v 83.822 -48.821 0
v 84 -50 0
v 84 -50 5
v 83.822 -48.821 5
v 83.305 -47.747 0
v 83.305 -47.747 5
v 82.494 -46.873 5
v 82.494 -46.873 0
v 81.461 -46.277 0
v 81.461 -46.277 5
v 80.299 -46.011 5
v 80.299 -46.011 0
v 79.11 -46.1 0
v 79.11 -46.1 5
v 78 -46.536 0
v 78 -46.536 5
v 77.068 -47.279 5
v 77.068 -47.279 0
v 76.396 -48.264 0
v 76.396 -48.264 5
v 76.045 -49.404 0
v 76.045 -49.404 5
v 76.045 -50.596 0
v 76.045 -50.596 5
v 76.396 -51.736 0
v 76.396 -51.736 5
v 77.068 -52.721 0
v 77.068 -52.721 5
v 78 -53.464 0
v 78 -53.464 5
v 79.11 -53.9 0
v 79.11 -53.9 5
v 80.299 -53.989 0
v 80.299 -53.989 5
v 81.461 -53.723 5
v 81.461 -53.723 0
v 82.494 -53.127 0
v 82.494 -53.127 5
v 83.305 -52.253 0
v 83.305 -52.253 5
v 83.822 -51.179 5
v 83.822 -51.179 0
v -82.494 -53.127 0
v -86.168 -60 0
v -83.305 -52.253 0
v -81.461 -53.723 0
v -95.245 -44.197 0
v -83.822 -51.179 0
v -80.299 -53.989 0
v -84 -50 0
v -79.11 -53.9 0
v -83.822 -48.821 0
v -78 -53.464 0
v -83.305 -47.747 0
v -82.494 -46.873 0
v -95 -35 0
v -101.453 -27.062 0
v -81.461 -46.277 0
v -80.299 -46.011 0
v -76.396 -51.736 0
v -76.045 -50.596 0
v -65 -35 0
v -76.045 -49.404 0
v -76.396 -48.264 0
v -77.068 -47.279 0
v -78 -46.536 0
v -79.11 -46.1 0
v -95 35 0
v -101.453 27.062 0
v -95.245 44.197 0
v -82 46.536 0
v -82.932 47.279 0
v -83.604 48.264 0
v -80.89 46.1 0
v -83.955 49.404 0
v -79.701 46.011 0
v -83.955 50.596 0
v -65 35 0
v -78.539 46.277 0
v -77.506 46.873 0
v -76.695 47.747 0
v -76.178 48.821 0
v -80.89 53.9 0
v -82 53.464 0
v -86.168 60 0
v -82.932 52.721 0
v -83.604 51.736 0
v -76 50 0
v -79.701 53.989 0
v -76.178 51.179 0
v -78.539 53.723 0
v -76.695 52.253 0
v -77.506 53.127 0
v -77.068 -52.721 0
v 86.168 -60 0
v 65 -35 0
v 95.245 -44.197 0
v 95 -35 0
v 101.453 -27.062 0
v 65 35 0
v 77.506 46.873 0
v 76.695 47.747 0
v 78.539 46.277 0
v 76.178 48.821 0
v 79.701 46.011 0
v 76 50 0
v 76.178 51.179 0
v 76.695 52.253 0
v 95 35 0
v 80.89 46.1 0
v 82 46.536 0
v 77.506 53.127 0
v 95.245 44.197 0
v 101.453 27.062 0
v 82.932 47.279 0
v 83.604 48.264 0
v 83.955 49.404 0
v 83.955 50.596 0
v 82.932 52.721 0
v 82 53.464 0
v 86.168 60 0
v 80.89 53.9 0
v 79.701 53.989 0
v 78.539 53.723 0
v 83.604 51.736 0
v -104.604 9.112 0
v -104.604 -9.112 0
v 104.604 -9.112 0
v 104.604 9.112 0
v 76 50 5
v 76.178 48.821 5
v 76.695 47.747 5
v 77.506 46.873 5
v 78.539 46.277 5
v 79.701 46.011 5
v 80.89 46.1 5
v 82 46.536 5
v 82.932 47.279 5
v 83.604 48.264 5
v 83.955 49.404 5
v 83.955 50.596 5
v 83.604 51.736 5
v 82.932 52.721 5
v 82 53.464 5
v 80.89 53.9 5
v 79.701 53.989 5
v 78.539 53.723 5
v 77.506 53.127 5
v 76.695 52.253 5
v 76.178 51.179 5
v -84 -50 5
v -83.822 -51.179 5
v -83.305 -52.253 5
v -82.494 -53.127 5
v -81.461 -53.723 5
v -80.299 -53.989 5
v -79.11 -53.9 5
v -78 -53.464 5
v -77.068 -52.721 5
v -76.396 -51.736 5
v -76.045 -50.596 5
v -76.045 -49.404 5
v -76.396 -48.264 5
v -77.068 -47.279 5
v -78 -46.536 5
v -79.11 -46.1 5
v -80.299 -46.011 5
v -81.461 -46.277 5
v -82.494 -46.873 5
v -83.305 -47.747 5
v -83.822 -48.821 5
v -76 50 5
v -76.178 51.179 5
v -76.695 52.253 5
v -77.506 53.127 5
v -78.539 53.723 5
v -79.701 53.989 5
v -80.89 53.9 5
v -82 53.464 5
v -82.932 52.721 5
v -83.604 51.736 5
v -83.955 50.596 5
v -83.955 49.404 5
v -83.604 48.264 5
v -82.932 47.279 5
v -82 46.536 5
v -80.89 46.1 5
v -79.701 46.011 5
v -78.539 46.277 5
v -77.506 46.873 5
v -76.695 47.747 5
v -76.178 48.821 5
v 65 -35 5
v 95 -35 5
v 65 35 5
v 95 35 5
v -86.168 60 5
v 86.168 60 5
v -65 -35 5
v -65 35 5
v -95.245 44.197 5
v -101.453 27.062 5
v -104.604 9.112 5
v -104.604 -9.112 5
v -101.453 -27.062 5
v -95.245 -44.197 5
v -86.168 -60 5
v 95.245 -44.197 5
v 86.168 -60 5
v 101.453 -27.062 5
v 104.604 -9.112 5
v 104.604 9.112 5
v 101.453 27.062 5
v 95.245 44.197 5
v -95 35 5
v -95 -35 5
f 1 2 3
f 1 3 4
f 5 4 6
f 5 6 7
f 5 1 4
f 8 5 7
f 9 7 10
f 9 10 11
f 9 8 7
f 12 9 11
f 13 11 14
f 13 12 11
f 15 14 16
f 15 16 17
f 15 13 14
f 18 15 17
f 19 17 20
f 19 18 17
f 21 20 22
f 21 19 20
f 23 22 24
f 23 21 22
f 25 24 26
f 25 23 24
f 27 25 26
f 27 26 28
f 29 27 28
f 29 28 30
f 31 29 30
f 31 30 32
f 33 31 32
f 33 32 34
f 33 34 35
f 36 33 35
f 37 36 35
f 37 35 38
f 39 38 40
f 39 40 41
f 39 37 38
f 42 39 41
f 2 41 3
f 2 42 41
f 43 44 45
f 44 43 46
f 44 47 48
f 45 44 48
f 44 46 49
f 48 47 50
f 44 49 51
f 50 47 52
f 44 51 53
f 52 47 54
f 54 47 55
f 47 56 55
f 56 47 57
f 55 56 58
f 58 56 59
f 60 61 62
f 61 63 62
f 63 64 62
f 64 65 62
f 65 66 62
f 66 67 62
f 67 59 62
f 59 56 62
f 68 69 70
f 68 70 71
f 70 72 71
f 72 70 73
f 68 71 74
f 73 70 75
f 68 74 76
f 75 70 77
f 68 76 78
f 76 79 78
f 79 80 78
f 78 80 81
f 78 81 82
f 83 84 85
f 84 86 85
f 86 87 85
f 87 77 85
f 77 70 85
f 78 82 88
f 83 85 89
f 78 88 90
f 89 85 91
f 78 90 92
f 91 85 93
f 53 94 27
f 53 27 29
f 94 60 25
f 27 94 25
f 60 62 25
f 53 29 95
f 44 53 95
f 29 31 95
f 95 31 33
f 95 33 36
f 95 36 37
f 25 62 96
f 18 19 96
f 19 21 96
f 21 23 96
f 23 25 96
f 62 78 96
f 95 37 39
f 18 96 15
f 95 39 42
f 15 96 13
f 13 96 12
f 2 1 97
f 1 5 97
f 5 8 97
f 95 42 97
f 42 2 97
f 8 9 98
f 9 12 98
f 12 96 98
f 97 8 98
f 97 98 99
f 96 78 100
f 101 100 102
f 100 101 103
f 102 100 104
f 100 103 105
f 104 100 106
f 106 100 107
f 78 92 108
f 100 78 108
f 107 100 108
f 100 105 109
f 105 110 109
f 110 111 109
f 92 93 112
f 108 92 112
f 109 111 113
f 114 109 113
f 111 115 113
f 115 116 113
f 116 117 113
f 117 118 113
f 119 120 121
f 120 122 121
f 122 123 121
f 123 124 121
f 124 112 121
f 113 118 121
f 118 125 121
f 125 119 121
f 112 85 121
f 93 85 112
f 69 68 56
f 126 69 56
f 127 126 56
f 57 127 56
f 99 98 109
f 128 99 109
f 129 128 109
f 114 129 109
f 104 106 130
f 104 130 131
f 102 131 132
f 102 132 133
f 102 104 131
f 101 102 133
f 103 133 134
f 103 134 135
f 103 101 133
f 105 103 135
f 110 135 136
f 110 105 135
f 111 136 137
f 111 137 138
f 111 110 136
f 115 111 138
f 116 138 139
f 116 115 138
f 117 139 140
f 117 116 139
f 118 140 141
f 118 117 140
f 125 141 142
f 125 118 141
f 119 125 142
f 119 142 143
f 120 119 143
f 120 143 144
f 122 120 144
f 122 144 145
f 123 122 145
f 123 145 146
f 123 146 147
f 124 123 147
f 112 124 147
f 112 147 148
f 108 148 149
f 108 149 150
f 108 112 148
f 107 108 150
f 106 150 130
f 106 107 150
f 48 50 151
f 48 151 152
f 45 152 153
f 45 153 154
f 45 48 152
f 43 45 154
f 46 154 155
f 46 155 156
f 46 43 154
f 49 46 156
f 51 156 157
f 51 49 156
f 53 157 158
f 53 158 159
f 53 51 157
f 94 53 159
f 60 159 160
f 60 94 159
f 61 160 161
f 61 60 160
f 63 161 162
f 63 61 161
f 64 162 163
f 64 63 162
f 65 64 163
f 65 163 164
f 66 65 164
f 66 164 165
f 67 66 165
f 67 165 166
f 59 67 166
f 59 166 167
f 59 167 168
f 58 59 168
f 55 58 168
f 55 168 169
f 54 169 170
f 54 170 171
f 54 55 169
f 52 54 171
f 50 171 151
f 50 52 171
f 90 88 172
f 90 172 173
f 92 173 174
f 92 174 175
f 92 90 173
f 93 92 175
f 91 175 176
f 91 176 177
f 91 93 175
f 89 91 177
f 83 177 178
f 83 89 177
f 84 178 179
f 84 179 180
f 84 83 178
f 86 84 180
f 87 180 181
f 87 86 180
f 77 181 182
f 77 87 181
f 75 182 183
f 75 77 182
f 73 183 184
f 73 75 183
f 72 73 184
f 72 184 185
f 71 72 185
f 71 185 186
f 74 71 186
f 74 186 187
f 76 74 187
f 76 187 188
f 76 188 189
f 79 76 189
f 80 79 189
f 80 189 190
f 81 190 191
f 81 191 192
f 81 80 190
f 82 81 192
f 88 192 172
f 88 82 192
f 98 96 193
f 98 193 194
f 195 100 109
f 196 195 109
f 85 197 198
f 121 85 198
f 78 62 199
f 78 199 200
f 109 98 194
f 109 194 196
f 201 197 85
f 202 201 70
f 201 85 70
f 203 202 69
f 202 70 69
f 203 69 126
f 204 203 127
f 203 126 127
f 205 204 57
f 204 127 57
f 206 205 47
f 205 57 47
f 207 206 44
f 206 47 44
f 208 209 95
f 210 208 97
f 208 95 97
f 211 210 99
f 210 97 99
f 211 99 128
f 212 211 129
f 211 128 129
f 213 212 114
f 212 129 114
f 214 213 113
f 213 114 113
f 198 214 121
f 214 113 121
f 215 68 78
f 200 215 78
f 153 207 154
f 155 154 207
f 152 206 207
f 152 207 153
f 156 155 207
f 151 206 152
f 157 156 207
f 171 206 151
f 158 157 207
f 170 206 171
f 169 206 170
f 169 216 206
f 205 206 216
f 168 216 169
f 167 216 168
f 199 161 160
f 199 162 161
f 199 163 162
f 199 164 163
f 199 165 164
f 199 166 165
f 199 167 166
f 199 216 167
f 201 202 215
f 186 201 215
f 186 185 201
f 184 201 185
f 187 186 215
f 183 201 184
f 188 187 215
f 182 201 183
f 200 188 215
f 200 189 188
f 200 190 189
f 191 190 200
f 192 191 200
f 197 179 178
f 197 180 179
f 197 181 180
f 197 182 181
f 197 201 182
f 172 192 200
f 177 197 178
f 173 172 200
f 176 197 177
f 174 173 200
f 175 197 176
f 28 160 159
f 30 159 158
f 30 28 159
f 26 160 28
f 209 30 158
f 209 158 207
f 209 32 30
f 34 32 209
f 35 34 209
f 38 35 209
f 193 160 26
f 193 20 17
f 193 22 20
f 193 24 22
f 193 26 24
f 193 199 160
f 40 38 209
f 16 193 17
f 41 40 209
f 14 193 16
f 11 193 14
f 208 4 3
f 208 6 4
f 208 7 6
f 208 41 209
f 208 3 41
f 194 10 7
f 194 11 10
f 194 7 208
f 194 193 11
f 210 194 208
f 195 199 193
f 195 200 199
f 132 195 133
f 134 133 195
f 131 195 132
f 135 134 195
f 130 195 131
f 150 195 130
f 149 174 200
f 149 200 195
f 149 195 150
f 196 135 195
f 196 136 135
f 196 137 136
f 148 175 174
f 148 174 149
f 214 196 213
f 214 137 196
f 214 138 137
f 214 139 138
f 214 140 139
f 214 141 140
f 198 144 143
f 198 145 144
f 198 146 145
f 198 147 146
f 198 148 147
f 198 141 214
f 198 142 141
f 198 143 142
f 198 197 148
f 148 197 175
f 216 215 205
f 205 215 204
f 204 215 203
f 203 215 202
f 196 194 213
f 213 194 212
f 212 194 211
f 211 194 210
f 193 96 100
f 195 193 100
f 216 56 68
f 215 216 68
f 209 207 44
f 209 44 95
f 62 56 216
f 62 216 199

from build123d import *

# Parameters (mm, degrees)
ESQUISSE1_R             = 105
ESQUISSE1_R_2           = 4
ESQUISSE1_W             = 30
ESQUISSE1_H             = 70
BOSS_EXTRU_1_DEPTH      = 5
ESQUISSE2_W             = 250
ESQUISSE2_H             = 50
ENL_V_MAT_EXTRU_1_DEPTH = 149.576579581


with BuildPart() as part:
    # Esquisse1 → Boss.-Extru.1 (new body)
    with BuildSketch(Plane.XY):
        Circle(ESQUISSE1_R)
        with Locations((-80, 50)):
            Circle(ESQUISSE1_R_2, mode=Mode.SUBTRACT)
        with Locations(Location((80, 50, 0), (0, 0, 180))):
            Circle(ESQUISSE1_R_2, mode=Mode.SUBTRACT)
        with Locations((80, -50)):
            Circle(ESQUISSE1_R_2, mode=Mode.SUBTRACT)
        with Locations(Location((-80, -50, 0), (0, 0, 180))):
            Circle(ESQUISSE1_R_2, mode=Mode.SUBTRACT)
        with Locations((-80, 0)):
            Rectangle(ESQUISSE1_W, ESQUISSE1_H, mode=Mode.SUBTRACT)
        with Locations((80, 0)):
            Rectangle(ESQUISSE1_W, ESQUISSE1_H, mode=Mode.SUBTRACT)
    extrude(amount=BOSS_EXTRU_1_DEPTH)

    # Esquisse2 → Enlèv. mat.-Extru.1 (cut, through all)
    with BuildSketch(Plane.XY.offset(5)):
        with Locations((0, 85)):
            Rectangle(ESQUISSE2_W, ESQUISSE2_H)
        with Locations((0, -85)):
            Rectangle(ESQUISSE2_W, ESQUISSE2_H)
    extrude(amount=-ENL_V_MAT_EXTRU_1_DEPTH, mode=Mode.SUBTRACT)


solid = part.part
